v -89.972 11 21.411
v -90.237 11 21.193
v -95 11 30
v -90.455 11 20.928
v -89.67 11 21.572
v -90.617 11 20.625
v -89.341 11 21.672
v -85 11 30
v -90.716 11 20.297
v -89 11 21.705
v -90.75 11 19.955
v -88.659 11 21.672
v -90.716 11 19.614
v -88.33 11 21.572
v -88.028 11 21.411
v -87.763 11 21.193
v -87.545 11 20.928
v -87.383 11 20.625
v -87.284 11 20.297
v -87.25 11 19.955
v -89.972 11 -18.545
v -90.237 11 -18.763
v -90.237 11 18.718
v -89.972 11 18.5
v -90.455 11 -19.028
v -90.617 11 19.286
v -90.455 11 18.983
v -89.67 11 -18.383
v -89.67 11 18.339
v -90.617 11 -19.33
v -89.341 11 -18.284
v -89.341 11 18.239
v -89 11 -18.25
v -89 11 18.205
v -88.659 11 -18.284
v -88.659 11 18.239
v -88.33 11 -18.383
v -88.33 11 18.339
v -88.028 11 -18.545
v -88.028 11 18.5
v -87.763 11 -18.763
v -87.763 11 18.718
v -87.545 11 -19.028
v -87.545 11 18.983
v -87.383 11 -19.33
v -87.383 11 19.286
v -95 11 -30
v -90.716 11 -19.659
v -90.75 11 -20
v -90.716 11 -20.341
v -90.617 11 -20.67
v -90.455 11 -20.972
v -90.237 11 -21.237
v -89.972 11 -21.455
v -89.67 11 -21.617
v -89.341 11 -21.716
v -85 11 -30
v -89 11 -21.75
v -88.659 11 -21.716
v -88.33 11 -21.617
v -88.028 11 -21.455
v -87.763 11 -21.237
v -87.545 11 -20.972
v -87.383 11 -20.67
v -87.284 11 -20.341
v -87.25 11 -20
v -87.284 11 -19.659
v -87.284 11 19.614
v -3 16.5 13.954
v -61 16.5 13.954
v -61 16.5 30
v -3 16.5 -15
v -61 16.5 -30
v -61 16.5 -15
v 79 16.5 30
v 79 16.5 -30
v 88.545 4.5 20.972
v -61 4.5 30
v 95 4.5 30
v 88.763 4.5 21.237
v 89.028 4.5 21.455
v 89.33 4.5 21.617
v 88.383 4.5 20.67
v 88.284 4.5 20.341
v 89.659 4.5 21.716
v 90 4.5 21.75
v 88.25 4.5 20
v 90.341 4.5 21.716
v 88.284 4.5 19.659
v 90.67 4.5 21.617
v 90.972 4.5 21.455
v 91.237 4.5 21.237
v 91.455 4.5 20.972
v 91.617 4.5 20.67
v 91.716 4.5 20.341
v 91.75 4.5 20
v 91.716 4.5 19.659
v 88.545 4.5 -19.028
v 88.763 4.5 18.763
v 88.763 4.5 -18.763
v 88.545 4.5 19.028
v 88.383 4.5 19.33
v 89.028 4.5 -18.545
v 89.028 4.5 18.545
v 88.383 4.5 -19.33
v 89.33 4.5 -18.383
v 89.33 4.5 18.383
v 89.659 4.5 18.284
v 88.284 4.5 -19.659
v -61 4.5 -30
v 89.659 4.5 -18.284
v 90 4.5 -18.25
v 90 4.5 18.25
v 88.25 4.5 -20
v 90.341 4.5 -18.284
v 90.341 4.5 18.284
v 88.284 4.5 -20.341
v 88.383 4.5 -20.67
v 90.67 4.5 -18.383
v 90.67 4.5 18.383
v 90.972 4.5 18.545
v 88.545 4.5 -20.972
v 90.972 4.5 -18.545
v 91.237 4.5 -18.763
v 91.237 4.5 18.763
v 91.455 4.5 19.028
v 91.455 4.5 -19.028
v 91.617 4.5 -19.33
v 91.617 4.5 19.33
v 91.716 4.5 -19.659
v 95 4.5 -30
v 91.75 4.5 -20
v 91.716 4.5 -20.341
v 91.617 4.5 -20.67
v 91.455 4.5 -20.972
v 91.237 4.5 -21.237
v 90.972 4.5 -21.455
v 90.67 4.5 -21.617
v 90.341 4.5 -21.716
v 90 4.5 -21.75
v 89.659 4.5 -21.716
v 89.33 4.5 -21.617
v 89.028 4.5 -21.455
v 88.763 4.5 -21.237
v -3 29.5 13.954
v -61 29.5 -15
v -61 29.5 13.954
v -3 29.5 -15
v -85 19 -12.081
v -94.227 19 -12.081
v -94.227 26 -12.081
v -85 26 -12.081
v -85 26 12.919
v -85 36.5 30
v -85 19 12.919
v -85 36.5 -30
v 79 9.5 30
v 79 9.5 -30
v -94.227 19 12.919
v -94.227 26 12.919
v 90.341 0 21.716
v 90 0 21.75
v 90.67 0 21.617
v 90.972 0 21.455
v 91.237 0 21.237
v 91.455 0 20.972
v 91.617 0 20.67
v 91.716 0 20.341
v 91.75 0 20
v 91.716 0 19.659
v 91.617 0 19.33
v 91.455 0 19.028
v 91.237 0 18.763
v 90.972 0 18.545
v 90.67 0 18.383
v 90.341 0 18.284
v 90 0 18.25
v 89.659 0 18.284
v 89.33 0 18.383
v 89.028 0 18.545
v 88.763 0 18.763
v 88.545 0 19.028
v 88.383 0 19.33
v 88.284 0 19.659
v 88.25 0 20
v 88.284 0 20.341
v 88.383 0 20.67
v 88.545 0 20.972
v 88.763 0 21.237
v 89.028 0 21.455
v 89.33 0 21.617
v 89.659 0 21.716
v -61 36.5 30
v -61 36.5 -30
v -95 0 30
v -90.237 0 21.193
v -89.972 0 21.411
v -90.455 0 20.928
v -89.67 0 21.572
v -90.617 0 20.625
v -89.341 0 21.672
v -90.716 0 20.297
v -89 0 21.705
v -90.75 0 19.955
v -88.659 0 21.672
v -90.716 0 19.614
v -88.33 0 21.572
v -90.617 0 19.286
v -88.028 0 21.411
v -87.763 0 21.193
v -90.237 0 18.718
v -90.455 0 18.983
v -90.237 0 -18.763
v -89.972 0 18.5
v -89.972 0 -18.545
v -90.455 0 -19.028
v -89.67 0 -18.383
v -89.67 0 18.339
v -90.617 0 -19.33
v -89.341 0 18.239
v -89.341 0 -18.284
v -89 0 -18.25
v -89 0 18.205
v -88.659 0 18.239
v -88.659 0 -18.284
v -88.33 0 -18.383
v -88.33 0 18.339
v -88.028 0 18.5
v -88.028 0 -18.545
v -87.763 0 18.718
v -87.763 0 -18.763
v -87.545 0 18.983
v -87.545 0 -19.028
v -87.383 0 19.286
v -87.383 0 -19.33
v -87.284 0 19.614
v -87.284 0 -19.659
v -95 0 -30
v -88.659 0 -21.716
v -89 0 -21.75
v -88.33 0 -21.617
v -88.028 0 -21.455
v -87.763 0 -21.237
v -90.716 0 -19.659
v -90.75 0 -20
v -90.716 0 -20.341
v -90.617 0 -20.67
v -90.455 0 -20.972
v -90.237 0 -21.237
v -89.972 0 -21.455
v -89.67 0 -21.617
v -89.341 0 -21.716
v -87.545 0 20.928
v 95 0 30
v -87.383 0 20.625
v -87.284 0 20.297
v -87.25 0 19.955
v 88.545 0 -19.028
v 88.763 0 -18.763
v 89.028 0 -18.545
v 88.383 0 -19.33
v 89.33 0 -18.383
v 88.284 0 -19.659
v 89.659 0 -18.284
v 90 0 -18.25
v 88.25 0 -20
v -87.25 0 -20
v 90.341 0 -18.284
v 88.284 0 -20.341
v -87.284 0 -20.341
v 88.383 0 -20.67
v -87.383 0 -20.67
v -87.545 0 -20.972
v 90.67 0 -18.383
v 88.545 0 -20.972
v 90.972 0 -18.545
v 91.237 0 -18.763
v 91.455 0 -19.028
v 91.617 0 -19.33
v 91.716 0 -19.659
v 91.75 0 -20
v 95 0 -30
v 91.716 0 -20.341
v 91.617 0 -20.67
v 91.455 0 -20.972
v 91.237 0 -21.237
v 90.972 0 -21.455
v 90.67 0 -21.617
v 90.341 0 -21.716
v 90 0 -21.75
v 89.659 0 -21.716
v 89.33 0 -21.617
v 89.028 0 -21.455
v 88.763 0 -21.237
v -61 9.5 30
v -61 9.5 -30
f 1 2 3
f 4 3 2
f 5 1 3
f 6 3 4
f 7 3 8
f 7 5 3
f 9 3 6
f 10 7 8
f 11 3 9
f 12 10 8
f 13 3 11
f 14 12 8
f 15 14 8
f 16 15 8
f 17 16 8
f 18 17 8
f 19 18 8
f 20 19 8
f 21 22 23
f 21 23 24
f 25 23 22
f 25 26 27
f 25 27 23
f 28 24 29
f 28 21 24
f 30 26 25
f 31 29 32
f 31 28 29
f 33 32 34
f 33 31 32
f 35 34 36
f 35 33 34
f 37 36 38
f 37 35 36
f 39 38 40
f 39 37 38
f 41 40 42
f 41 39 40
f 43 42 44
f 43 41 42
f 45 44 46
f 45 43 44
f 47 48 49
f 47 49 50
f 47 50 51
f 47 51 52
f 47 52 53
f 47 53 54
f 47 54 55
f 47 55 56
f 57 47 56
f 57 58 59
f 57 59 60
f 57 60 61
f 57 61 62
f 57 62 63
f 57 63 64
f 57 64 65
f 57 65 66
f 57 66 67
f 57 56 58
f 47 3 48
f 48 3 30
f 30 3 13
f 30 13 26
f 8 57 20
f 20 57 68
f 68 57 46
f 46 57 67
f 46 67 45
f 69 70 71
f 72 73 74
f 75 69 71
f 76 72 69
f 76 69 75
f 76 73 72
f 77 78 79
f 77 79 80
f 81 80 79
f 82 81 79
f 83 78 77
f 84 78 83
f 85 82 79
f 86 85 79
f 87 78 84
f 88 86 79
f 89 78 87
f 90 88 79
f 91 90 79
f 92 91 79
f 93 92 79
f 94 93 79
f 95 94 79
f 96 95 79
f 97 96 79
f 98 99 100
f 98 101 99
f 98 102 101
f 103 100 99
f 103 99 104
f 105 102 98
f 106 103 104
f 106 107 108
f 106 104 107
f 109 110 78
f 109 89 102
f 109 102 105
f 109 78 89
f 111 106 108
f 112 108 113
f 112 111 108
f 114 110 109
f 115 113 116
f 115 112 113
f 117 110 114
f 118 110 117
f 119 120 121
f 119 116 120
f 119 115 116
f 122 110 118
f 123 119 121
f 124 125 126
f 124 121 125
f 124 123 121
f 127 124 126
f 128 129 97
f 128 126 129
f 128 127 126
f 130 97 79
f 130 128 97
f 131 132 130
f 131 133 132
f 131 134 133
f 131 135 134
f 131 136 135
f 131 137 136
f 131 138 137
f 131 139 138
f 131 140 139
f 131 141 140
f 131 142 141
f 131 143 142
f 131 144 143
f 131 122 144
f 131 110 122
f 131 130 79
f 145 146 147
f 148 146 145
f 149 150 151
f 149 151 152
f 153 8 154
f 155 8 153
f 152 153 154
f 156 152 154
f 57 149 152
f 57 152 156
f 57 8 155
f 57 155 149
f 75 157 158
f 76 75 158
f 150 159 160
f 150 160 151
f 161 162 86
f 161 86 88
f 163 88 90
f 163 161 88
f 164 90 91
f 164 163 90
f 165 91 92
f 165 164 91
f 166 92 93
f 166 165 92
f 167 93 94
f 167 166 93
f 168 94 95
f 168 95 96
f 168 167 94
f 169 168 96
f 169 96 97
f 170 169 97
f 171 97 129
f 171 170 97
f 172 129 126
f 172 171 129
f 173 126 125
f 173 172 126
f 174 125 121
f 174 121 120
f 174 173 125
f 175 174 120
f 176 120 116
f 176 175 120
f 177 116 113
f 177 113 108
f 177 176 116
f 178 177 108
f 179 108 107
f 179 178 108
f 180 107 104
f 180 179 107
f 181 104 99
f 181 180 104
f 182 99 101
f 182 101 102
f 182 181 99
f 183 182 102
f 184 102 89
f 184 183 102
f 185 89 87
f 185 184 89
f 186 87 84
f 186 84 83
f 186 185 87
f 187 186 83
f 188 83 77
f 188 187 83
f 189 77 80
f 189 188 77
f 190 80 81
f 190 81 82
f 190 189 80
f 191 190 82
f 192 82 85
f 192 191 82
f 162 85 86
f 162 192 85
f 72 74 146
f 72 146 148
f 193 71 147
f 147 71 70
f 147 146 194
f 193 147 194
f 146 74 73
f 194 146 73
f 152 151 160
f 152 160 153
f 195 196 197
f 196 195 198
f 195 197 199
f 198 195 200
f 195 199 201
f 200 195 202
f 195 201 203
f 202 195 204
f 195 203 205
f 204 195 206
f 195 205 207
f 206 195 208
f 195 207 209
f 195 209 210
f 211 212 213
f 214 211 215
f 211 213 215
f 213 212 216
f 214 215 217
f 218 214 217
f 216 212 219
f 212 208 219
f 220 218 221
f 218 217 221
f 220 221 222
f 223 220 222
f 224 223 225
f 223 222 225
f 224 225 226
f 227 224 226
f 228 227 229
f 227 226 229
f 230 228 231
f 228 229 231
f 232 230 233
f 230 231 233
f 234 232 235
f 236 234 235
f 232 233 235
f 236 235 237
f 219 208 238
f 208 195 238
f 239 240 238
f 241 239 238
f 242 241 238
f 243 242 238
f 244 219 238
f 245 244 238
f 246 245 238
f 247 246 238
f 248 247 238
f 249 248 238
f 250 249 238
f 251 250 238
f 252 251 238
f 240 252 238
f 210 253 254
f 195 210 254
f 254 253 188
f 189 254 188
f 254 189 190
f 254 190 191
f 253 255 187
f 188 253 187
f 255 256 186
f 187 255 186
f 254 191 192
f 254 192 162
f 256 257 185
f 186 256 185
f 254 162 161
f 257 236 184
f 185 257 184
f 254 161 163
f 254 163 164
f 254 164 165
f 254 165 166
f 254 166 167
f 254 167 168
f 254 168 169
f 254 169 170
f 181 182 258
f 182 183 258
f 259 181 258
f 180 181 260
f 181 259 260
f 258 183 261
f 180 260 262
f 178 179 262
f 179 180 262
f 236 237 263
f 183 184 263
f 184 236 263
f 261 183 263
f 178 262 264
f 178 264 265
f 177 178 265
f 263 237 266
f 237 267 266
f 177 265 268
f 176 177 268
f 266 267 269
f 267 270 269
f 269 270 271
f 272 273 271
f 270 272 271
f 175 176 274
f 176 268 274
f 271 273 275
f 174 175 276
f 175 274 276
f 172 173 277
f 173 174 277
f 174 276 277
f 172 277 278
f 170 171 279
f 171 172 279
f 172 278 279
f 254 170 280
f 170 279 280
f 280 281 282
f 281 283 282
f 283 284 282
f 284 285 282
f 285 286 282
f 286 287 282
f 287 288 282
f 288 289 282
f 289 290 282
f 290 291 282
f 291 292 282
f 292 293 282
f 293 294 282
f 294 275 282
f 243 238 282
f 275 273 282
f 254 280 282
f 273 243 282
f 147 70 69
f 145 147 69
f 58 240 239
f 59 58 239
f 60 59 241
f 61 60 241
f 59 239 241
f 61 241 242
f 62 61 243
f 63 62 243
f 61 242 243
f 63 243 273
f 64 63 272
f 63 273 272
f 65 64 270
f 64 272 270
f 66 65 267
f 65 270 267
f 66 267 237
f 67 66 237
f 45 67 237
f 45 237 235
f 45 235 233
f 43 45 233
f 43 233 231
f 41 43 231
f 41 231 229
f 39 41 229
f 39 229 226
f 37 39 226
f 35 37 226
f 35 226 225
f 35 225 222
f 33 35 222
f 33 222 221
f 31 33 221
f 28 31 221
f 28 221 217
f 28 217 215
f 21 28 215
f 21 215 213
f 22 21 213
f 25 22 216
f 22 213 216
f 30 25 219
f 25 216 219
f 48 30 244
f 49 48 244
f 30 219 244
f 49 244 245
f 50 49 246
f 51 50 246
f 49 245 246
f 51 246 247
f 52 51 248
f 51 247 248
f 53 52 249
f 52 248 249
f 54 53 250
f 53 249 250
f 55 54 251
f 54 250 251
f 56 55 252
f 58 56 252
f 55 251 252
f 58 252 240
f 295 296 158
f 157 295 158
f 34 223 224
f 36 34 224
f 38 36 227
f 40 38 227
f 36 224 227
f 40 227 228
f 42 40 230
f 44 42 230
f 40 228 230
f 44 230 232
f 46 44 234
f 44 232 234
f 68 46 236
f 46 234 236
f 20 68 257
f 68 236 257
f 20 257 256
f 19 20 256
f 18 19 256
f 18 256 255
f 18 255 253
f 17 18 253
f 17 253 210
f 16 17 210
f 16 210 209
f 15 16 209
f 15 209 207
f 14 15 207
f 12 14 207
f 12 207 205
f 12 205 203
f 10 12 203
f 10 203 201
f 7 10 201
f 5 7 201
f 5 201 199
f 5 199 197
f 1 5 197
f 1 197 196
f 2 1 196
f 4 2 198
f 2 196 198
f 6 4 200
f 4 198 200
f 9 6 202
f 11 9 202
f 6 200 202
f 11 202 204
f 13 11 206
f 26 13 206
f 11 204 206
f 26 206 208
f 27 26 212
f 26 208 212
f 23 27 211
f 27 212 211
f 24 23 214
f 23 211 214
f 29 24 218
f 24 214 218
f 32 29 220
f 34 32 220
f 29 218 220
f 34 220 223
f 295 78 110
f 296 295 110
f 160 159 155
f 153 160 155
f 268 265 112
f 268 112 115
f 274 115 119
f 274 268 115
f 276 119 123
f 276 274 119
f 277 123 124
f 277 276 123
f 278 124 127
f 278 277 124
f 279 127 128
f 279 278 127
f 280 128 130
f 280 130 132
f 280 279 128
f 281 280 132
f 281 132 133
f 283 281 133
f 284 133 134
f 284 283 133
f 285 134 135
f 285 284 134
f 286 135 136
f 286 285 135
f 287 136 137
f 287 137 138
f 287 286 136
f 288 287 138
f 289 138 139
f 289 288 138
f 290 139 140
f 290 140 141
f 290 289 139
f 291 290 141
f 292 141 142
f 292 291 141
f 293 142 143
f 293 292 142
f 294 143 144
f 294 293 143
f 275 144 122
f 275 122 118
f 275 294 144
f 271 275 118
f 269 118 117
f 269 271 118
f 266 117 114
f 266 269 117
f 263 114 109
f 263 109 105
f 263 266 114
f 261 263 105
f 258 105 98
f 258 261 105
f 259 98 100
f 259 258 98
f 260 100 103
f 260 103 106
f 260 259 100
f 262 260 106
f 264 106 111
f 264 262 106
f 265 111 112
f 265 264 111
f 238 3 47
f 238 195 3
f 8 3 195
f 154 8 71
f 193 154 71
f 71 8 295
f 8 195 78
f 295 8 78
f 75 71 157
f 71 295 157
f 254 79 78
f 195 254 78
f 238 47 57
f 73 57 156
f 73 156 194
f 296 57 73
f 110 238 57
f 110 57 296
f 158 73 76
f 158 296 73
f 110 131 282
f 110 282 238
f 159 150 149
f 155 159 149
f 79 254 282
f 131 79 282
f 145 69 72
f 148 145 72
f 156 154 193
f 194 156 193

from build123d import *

# Parameters (mm, degrees)
SKETCH1_W           = 190
SKETCH1_H           = 60
SKETCH1_R           = 1.75
BOSS_EXTRUDE1_DEPTH = 4.5
SKETCH2_W           = 10
SKETCH2_H           = 60
BOSS_EXTRUDE2_DEPTH = 6.5
SKETCH3_W           = 24
SKETCH3_H           = 60
BOSS_EXTRUDE3_DEPTH = 32
SKETCH5_W           = 20
SKETCH5_H           = 25
BOSS_EXTRUDE4_DEPTH = 7
SKETCH6_W           = 140
SKETCH6_H           = 60
BOSS_EXTRUDE5_DEPTH = 7
SKETCH7_W           = 58
SKETCH7_H           = 28.953821303
BOSS_EXTRUDE6_DEPTH = 13
SKETCH8_R           = 1.75
CUT_EXTRUDE1_DEPTH  = 13


with BuildPart() as part:
    # Sketch1 → Boss-Extrude1 (new body)
    with BuildSketch(Plane(origin=(0, 0, 0), x_dir=(1, 0, 0), z_dir=(0, 1, 0))):
        Rectangle(SKETCH1_W, SKETCH1_H)
        with Locations(Location((90, -20, 0), (0, 0, 270))):
            Circle(SKETCH1_R, mode=Mode.SUBTRACT)
        with Locations(Location((90, 20, 0), (0, 0, 270))):
            Circle(SKETCH1_R, mode=Mode.SUBTRACT)
    extrude(amount=BOSS_EXTRUDE1_DEPTH)

    # Sketch2 → Boss-Extrude2 (add)
    with BuildSketch(Plane(origin=(0, 4.5, 0), x_dir=(1, 0, 0), z_dir=(0, 1, 0))):
        with Locations((-90, 0)):
            Rectangle(SKETCH2_W, SKETCH2_H)
    extrude(amount=BOSS_EXTRUDE2_DEPTH)

    # Sketch3 → Boss-Extrude3 (add)
    with BuildSketch(Plane(origin=(0, 4.5, 0), x_dir=(1, 0, 0), z_dir=(0, 1, 0))):
        with Locations((-73, 0)):
            Rectangle(SKETCH3_W, SKETCH3_H)
    extrude(amount=BOSS_EXTRUDE3_DEPTH)

    # Sketch5 → Boss-Extrude4 (add)
    with BuildSketch(Plane(origin=(0, 19, 0), x_dir=(1, 0, 0), z_dir=(0, 1, 0))):
        with Locations((-84.226759087, -0.419143158)):
            Rectangle(SKETCH5_W, SKETCH5_H)
    extrude(amount=BOSS_EXTRUDE4_DEPTH)

    # Sketch6 → Boss-Extrude5 (add)
    with BuildSketch(Plane(origin=(0, 9.5, 0), x_dir=(1, 0, 0), z_dir=(0, 1, 0))):
        with Locations((9, 0)):
            Rectangle(SKETCH6_W, SKETCH6_H)
    extrude(amount=BOSS_EXTRUDE5_DEPTH)

    # Sketch7 → Boss-Extrude6 (add)
    with BuildSketch(Plane(origin=(0, 16.5, 0), x_dir=(1, 0, 0), z_dir=(0, 1, 0))):
        with Locations((-32, 0.523089349)):
            Rectangle(SKETCH7_W, SKETCH7_H)
    extrude(amount=BOSS_EXTRUDE6_DEPTH)

    # Sketch8 → Cut-Extrude1 (cut)
    with BuildSketch(Plane.XZ):
        with Locations(Location((-89, -20, 0), (0, 0, 270))):
            Circle(SKETCH8_R)
        with Locations(Location((-89, 19.955464874, 0), (0, 0, 270))):
            Circle(SKETCH8_R)
    extrude(amount=-CUT_EXTRUDE1_DEPTH, mode=Mode.SUBTRACT)


solid = part.part
